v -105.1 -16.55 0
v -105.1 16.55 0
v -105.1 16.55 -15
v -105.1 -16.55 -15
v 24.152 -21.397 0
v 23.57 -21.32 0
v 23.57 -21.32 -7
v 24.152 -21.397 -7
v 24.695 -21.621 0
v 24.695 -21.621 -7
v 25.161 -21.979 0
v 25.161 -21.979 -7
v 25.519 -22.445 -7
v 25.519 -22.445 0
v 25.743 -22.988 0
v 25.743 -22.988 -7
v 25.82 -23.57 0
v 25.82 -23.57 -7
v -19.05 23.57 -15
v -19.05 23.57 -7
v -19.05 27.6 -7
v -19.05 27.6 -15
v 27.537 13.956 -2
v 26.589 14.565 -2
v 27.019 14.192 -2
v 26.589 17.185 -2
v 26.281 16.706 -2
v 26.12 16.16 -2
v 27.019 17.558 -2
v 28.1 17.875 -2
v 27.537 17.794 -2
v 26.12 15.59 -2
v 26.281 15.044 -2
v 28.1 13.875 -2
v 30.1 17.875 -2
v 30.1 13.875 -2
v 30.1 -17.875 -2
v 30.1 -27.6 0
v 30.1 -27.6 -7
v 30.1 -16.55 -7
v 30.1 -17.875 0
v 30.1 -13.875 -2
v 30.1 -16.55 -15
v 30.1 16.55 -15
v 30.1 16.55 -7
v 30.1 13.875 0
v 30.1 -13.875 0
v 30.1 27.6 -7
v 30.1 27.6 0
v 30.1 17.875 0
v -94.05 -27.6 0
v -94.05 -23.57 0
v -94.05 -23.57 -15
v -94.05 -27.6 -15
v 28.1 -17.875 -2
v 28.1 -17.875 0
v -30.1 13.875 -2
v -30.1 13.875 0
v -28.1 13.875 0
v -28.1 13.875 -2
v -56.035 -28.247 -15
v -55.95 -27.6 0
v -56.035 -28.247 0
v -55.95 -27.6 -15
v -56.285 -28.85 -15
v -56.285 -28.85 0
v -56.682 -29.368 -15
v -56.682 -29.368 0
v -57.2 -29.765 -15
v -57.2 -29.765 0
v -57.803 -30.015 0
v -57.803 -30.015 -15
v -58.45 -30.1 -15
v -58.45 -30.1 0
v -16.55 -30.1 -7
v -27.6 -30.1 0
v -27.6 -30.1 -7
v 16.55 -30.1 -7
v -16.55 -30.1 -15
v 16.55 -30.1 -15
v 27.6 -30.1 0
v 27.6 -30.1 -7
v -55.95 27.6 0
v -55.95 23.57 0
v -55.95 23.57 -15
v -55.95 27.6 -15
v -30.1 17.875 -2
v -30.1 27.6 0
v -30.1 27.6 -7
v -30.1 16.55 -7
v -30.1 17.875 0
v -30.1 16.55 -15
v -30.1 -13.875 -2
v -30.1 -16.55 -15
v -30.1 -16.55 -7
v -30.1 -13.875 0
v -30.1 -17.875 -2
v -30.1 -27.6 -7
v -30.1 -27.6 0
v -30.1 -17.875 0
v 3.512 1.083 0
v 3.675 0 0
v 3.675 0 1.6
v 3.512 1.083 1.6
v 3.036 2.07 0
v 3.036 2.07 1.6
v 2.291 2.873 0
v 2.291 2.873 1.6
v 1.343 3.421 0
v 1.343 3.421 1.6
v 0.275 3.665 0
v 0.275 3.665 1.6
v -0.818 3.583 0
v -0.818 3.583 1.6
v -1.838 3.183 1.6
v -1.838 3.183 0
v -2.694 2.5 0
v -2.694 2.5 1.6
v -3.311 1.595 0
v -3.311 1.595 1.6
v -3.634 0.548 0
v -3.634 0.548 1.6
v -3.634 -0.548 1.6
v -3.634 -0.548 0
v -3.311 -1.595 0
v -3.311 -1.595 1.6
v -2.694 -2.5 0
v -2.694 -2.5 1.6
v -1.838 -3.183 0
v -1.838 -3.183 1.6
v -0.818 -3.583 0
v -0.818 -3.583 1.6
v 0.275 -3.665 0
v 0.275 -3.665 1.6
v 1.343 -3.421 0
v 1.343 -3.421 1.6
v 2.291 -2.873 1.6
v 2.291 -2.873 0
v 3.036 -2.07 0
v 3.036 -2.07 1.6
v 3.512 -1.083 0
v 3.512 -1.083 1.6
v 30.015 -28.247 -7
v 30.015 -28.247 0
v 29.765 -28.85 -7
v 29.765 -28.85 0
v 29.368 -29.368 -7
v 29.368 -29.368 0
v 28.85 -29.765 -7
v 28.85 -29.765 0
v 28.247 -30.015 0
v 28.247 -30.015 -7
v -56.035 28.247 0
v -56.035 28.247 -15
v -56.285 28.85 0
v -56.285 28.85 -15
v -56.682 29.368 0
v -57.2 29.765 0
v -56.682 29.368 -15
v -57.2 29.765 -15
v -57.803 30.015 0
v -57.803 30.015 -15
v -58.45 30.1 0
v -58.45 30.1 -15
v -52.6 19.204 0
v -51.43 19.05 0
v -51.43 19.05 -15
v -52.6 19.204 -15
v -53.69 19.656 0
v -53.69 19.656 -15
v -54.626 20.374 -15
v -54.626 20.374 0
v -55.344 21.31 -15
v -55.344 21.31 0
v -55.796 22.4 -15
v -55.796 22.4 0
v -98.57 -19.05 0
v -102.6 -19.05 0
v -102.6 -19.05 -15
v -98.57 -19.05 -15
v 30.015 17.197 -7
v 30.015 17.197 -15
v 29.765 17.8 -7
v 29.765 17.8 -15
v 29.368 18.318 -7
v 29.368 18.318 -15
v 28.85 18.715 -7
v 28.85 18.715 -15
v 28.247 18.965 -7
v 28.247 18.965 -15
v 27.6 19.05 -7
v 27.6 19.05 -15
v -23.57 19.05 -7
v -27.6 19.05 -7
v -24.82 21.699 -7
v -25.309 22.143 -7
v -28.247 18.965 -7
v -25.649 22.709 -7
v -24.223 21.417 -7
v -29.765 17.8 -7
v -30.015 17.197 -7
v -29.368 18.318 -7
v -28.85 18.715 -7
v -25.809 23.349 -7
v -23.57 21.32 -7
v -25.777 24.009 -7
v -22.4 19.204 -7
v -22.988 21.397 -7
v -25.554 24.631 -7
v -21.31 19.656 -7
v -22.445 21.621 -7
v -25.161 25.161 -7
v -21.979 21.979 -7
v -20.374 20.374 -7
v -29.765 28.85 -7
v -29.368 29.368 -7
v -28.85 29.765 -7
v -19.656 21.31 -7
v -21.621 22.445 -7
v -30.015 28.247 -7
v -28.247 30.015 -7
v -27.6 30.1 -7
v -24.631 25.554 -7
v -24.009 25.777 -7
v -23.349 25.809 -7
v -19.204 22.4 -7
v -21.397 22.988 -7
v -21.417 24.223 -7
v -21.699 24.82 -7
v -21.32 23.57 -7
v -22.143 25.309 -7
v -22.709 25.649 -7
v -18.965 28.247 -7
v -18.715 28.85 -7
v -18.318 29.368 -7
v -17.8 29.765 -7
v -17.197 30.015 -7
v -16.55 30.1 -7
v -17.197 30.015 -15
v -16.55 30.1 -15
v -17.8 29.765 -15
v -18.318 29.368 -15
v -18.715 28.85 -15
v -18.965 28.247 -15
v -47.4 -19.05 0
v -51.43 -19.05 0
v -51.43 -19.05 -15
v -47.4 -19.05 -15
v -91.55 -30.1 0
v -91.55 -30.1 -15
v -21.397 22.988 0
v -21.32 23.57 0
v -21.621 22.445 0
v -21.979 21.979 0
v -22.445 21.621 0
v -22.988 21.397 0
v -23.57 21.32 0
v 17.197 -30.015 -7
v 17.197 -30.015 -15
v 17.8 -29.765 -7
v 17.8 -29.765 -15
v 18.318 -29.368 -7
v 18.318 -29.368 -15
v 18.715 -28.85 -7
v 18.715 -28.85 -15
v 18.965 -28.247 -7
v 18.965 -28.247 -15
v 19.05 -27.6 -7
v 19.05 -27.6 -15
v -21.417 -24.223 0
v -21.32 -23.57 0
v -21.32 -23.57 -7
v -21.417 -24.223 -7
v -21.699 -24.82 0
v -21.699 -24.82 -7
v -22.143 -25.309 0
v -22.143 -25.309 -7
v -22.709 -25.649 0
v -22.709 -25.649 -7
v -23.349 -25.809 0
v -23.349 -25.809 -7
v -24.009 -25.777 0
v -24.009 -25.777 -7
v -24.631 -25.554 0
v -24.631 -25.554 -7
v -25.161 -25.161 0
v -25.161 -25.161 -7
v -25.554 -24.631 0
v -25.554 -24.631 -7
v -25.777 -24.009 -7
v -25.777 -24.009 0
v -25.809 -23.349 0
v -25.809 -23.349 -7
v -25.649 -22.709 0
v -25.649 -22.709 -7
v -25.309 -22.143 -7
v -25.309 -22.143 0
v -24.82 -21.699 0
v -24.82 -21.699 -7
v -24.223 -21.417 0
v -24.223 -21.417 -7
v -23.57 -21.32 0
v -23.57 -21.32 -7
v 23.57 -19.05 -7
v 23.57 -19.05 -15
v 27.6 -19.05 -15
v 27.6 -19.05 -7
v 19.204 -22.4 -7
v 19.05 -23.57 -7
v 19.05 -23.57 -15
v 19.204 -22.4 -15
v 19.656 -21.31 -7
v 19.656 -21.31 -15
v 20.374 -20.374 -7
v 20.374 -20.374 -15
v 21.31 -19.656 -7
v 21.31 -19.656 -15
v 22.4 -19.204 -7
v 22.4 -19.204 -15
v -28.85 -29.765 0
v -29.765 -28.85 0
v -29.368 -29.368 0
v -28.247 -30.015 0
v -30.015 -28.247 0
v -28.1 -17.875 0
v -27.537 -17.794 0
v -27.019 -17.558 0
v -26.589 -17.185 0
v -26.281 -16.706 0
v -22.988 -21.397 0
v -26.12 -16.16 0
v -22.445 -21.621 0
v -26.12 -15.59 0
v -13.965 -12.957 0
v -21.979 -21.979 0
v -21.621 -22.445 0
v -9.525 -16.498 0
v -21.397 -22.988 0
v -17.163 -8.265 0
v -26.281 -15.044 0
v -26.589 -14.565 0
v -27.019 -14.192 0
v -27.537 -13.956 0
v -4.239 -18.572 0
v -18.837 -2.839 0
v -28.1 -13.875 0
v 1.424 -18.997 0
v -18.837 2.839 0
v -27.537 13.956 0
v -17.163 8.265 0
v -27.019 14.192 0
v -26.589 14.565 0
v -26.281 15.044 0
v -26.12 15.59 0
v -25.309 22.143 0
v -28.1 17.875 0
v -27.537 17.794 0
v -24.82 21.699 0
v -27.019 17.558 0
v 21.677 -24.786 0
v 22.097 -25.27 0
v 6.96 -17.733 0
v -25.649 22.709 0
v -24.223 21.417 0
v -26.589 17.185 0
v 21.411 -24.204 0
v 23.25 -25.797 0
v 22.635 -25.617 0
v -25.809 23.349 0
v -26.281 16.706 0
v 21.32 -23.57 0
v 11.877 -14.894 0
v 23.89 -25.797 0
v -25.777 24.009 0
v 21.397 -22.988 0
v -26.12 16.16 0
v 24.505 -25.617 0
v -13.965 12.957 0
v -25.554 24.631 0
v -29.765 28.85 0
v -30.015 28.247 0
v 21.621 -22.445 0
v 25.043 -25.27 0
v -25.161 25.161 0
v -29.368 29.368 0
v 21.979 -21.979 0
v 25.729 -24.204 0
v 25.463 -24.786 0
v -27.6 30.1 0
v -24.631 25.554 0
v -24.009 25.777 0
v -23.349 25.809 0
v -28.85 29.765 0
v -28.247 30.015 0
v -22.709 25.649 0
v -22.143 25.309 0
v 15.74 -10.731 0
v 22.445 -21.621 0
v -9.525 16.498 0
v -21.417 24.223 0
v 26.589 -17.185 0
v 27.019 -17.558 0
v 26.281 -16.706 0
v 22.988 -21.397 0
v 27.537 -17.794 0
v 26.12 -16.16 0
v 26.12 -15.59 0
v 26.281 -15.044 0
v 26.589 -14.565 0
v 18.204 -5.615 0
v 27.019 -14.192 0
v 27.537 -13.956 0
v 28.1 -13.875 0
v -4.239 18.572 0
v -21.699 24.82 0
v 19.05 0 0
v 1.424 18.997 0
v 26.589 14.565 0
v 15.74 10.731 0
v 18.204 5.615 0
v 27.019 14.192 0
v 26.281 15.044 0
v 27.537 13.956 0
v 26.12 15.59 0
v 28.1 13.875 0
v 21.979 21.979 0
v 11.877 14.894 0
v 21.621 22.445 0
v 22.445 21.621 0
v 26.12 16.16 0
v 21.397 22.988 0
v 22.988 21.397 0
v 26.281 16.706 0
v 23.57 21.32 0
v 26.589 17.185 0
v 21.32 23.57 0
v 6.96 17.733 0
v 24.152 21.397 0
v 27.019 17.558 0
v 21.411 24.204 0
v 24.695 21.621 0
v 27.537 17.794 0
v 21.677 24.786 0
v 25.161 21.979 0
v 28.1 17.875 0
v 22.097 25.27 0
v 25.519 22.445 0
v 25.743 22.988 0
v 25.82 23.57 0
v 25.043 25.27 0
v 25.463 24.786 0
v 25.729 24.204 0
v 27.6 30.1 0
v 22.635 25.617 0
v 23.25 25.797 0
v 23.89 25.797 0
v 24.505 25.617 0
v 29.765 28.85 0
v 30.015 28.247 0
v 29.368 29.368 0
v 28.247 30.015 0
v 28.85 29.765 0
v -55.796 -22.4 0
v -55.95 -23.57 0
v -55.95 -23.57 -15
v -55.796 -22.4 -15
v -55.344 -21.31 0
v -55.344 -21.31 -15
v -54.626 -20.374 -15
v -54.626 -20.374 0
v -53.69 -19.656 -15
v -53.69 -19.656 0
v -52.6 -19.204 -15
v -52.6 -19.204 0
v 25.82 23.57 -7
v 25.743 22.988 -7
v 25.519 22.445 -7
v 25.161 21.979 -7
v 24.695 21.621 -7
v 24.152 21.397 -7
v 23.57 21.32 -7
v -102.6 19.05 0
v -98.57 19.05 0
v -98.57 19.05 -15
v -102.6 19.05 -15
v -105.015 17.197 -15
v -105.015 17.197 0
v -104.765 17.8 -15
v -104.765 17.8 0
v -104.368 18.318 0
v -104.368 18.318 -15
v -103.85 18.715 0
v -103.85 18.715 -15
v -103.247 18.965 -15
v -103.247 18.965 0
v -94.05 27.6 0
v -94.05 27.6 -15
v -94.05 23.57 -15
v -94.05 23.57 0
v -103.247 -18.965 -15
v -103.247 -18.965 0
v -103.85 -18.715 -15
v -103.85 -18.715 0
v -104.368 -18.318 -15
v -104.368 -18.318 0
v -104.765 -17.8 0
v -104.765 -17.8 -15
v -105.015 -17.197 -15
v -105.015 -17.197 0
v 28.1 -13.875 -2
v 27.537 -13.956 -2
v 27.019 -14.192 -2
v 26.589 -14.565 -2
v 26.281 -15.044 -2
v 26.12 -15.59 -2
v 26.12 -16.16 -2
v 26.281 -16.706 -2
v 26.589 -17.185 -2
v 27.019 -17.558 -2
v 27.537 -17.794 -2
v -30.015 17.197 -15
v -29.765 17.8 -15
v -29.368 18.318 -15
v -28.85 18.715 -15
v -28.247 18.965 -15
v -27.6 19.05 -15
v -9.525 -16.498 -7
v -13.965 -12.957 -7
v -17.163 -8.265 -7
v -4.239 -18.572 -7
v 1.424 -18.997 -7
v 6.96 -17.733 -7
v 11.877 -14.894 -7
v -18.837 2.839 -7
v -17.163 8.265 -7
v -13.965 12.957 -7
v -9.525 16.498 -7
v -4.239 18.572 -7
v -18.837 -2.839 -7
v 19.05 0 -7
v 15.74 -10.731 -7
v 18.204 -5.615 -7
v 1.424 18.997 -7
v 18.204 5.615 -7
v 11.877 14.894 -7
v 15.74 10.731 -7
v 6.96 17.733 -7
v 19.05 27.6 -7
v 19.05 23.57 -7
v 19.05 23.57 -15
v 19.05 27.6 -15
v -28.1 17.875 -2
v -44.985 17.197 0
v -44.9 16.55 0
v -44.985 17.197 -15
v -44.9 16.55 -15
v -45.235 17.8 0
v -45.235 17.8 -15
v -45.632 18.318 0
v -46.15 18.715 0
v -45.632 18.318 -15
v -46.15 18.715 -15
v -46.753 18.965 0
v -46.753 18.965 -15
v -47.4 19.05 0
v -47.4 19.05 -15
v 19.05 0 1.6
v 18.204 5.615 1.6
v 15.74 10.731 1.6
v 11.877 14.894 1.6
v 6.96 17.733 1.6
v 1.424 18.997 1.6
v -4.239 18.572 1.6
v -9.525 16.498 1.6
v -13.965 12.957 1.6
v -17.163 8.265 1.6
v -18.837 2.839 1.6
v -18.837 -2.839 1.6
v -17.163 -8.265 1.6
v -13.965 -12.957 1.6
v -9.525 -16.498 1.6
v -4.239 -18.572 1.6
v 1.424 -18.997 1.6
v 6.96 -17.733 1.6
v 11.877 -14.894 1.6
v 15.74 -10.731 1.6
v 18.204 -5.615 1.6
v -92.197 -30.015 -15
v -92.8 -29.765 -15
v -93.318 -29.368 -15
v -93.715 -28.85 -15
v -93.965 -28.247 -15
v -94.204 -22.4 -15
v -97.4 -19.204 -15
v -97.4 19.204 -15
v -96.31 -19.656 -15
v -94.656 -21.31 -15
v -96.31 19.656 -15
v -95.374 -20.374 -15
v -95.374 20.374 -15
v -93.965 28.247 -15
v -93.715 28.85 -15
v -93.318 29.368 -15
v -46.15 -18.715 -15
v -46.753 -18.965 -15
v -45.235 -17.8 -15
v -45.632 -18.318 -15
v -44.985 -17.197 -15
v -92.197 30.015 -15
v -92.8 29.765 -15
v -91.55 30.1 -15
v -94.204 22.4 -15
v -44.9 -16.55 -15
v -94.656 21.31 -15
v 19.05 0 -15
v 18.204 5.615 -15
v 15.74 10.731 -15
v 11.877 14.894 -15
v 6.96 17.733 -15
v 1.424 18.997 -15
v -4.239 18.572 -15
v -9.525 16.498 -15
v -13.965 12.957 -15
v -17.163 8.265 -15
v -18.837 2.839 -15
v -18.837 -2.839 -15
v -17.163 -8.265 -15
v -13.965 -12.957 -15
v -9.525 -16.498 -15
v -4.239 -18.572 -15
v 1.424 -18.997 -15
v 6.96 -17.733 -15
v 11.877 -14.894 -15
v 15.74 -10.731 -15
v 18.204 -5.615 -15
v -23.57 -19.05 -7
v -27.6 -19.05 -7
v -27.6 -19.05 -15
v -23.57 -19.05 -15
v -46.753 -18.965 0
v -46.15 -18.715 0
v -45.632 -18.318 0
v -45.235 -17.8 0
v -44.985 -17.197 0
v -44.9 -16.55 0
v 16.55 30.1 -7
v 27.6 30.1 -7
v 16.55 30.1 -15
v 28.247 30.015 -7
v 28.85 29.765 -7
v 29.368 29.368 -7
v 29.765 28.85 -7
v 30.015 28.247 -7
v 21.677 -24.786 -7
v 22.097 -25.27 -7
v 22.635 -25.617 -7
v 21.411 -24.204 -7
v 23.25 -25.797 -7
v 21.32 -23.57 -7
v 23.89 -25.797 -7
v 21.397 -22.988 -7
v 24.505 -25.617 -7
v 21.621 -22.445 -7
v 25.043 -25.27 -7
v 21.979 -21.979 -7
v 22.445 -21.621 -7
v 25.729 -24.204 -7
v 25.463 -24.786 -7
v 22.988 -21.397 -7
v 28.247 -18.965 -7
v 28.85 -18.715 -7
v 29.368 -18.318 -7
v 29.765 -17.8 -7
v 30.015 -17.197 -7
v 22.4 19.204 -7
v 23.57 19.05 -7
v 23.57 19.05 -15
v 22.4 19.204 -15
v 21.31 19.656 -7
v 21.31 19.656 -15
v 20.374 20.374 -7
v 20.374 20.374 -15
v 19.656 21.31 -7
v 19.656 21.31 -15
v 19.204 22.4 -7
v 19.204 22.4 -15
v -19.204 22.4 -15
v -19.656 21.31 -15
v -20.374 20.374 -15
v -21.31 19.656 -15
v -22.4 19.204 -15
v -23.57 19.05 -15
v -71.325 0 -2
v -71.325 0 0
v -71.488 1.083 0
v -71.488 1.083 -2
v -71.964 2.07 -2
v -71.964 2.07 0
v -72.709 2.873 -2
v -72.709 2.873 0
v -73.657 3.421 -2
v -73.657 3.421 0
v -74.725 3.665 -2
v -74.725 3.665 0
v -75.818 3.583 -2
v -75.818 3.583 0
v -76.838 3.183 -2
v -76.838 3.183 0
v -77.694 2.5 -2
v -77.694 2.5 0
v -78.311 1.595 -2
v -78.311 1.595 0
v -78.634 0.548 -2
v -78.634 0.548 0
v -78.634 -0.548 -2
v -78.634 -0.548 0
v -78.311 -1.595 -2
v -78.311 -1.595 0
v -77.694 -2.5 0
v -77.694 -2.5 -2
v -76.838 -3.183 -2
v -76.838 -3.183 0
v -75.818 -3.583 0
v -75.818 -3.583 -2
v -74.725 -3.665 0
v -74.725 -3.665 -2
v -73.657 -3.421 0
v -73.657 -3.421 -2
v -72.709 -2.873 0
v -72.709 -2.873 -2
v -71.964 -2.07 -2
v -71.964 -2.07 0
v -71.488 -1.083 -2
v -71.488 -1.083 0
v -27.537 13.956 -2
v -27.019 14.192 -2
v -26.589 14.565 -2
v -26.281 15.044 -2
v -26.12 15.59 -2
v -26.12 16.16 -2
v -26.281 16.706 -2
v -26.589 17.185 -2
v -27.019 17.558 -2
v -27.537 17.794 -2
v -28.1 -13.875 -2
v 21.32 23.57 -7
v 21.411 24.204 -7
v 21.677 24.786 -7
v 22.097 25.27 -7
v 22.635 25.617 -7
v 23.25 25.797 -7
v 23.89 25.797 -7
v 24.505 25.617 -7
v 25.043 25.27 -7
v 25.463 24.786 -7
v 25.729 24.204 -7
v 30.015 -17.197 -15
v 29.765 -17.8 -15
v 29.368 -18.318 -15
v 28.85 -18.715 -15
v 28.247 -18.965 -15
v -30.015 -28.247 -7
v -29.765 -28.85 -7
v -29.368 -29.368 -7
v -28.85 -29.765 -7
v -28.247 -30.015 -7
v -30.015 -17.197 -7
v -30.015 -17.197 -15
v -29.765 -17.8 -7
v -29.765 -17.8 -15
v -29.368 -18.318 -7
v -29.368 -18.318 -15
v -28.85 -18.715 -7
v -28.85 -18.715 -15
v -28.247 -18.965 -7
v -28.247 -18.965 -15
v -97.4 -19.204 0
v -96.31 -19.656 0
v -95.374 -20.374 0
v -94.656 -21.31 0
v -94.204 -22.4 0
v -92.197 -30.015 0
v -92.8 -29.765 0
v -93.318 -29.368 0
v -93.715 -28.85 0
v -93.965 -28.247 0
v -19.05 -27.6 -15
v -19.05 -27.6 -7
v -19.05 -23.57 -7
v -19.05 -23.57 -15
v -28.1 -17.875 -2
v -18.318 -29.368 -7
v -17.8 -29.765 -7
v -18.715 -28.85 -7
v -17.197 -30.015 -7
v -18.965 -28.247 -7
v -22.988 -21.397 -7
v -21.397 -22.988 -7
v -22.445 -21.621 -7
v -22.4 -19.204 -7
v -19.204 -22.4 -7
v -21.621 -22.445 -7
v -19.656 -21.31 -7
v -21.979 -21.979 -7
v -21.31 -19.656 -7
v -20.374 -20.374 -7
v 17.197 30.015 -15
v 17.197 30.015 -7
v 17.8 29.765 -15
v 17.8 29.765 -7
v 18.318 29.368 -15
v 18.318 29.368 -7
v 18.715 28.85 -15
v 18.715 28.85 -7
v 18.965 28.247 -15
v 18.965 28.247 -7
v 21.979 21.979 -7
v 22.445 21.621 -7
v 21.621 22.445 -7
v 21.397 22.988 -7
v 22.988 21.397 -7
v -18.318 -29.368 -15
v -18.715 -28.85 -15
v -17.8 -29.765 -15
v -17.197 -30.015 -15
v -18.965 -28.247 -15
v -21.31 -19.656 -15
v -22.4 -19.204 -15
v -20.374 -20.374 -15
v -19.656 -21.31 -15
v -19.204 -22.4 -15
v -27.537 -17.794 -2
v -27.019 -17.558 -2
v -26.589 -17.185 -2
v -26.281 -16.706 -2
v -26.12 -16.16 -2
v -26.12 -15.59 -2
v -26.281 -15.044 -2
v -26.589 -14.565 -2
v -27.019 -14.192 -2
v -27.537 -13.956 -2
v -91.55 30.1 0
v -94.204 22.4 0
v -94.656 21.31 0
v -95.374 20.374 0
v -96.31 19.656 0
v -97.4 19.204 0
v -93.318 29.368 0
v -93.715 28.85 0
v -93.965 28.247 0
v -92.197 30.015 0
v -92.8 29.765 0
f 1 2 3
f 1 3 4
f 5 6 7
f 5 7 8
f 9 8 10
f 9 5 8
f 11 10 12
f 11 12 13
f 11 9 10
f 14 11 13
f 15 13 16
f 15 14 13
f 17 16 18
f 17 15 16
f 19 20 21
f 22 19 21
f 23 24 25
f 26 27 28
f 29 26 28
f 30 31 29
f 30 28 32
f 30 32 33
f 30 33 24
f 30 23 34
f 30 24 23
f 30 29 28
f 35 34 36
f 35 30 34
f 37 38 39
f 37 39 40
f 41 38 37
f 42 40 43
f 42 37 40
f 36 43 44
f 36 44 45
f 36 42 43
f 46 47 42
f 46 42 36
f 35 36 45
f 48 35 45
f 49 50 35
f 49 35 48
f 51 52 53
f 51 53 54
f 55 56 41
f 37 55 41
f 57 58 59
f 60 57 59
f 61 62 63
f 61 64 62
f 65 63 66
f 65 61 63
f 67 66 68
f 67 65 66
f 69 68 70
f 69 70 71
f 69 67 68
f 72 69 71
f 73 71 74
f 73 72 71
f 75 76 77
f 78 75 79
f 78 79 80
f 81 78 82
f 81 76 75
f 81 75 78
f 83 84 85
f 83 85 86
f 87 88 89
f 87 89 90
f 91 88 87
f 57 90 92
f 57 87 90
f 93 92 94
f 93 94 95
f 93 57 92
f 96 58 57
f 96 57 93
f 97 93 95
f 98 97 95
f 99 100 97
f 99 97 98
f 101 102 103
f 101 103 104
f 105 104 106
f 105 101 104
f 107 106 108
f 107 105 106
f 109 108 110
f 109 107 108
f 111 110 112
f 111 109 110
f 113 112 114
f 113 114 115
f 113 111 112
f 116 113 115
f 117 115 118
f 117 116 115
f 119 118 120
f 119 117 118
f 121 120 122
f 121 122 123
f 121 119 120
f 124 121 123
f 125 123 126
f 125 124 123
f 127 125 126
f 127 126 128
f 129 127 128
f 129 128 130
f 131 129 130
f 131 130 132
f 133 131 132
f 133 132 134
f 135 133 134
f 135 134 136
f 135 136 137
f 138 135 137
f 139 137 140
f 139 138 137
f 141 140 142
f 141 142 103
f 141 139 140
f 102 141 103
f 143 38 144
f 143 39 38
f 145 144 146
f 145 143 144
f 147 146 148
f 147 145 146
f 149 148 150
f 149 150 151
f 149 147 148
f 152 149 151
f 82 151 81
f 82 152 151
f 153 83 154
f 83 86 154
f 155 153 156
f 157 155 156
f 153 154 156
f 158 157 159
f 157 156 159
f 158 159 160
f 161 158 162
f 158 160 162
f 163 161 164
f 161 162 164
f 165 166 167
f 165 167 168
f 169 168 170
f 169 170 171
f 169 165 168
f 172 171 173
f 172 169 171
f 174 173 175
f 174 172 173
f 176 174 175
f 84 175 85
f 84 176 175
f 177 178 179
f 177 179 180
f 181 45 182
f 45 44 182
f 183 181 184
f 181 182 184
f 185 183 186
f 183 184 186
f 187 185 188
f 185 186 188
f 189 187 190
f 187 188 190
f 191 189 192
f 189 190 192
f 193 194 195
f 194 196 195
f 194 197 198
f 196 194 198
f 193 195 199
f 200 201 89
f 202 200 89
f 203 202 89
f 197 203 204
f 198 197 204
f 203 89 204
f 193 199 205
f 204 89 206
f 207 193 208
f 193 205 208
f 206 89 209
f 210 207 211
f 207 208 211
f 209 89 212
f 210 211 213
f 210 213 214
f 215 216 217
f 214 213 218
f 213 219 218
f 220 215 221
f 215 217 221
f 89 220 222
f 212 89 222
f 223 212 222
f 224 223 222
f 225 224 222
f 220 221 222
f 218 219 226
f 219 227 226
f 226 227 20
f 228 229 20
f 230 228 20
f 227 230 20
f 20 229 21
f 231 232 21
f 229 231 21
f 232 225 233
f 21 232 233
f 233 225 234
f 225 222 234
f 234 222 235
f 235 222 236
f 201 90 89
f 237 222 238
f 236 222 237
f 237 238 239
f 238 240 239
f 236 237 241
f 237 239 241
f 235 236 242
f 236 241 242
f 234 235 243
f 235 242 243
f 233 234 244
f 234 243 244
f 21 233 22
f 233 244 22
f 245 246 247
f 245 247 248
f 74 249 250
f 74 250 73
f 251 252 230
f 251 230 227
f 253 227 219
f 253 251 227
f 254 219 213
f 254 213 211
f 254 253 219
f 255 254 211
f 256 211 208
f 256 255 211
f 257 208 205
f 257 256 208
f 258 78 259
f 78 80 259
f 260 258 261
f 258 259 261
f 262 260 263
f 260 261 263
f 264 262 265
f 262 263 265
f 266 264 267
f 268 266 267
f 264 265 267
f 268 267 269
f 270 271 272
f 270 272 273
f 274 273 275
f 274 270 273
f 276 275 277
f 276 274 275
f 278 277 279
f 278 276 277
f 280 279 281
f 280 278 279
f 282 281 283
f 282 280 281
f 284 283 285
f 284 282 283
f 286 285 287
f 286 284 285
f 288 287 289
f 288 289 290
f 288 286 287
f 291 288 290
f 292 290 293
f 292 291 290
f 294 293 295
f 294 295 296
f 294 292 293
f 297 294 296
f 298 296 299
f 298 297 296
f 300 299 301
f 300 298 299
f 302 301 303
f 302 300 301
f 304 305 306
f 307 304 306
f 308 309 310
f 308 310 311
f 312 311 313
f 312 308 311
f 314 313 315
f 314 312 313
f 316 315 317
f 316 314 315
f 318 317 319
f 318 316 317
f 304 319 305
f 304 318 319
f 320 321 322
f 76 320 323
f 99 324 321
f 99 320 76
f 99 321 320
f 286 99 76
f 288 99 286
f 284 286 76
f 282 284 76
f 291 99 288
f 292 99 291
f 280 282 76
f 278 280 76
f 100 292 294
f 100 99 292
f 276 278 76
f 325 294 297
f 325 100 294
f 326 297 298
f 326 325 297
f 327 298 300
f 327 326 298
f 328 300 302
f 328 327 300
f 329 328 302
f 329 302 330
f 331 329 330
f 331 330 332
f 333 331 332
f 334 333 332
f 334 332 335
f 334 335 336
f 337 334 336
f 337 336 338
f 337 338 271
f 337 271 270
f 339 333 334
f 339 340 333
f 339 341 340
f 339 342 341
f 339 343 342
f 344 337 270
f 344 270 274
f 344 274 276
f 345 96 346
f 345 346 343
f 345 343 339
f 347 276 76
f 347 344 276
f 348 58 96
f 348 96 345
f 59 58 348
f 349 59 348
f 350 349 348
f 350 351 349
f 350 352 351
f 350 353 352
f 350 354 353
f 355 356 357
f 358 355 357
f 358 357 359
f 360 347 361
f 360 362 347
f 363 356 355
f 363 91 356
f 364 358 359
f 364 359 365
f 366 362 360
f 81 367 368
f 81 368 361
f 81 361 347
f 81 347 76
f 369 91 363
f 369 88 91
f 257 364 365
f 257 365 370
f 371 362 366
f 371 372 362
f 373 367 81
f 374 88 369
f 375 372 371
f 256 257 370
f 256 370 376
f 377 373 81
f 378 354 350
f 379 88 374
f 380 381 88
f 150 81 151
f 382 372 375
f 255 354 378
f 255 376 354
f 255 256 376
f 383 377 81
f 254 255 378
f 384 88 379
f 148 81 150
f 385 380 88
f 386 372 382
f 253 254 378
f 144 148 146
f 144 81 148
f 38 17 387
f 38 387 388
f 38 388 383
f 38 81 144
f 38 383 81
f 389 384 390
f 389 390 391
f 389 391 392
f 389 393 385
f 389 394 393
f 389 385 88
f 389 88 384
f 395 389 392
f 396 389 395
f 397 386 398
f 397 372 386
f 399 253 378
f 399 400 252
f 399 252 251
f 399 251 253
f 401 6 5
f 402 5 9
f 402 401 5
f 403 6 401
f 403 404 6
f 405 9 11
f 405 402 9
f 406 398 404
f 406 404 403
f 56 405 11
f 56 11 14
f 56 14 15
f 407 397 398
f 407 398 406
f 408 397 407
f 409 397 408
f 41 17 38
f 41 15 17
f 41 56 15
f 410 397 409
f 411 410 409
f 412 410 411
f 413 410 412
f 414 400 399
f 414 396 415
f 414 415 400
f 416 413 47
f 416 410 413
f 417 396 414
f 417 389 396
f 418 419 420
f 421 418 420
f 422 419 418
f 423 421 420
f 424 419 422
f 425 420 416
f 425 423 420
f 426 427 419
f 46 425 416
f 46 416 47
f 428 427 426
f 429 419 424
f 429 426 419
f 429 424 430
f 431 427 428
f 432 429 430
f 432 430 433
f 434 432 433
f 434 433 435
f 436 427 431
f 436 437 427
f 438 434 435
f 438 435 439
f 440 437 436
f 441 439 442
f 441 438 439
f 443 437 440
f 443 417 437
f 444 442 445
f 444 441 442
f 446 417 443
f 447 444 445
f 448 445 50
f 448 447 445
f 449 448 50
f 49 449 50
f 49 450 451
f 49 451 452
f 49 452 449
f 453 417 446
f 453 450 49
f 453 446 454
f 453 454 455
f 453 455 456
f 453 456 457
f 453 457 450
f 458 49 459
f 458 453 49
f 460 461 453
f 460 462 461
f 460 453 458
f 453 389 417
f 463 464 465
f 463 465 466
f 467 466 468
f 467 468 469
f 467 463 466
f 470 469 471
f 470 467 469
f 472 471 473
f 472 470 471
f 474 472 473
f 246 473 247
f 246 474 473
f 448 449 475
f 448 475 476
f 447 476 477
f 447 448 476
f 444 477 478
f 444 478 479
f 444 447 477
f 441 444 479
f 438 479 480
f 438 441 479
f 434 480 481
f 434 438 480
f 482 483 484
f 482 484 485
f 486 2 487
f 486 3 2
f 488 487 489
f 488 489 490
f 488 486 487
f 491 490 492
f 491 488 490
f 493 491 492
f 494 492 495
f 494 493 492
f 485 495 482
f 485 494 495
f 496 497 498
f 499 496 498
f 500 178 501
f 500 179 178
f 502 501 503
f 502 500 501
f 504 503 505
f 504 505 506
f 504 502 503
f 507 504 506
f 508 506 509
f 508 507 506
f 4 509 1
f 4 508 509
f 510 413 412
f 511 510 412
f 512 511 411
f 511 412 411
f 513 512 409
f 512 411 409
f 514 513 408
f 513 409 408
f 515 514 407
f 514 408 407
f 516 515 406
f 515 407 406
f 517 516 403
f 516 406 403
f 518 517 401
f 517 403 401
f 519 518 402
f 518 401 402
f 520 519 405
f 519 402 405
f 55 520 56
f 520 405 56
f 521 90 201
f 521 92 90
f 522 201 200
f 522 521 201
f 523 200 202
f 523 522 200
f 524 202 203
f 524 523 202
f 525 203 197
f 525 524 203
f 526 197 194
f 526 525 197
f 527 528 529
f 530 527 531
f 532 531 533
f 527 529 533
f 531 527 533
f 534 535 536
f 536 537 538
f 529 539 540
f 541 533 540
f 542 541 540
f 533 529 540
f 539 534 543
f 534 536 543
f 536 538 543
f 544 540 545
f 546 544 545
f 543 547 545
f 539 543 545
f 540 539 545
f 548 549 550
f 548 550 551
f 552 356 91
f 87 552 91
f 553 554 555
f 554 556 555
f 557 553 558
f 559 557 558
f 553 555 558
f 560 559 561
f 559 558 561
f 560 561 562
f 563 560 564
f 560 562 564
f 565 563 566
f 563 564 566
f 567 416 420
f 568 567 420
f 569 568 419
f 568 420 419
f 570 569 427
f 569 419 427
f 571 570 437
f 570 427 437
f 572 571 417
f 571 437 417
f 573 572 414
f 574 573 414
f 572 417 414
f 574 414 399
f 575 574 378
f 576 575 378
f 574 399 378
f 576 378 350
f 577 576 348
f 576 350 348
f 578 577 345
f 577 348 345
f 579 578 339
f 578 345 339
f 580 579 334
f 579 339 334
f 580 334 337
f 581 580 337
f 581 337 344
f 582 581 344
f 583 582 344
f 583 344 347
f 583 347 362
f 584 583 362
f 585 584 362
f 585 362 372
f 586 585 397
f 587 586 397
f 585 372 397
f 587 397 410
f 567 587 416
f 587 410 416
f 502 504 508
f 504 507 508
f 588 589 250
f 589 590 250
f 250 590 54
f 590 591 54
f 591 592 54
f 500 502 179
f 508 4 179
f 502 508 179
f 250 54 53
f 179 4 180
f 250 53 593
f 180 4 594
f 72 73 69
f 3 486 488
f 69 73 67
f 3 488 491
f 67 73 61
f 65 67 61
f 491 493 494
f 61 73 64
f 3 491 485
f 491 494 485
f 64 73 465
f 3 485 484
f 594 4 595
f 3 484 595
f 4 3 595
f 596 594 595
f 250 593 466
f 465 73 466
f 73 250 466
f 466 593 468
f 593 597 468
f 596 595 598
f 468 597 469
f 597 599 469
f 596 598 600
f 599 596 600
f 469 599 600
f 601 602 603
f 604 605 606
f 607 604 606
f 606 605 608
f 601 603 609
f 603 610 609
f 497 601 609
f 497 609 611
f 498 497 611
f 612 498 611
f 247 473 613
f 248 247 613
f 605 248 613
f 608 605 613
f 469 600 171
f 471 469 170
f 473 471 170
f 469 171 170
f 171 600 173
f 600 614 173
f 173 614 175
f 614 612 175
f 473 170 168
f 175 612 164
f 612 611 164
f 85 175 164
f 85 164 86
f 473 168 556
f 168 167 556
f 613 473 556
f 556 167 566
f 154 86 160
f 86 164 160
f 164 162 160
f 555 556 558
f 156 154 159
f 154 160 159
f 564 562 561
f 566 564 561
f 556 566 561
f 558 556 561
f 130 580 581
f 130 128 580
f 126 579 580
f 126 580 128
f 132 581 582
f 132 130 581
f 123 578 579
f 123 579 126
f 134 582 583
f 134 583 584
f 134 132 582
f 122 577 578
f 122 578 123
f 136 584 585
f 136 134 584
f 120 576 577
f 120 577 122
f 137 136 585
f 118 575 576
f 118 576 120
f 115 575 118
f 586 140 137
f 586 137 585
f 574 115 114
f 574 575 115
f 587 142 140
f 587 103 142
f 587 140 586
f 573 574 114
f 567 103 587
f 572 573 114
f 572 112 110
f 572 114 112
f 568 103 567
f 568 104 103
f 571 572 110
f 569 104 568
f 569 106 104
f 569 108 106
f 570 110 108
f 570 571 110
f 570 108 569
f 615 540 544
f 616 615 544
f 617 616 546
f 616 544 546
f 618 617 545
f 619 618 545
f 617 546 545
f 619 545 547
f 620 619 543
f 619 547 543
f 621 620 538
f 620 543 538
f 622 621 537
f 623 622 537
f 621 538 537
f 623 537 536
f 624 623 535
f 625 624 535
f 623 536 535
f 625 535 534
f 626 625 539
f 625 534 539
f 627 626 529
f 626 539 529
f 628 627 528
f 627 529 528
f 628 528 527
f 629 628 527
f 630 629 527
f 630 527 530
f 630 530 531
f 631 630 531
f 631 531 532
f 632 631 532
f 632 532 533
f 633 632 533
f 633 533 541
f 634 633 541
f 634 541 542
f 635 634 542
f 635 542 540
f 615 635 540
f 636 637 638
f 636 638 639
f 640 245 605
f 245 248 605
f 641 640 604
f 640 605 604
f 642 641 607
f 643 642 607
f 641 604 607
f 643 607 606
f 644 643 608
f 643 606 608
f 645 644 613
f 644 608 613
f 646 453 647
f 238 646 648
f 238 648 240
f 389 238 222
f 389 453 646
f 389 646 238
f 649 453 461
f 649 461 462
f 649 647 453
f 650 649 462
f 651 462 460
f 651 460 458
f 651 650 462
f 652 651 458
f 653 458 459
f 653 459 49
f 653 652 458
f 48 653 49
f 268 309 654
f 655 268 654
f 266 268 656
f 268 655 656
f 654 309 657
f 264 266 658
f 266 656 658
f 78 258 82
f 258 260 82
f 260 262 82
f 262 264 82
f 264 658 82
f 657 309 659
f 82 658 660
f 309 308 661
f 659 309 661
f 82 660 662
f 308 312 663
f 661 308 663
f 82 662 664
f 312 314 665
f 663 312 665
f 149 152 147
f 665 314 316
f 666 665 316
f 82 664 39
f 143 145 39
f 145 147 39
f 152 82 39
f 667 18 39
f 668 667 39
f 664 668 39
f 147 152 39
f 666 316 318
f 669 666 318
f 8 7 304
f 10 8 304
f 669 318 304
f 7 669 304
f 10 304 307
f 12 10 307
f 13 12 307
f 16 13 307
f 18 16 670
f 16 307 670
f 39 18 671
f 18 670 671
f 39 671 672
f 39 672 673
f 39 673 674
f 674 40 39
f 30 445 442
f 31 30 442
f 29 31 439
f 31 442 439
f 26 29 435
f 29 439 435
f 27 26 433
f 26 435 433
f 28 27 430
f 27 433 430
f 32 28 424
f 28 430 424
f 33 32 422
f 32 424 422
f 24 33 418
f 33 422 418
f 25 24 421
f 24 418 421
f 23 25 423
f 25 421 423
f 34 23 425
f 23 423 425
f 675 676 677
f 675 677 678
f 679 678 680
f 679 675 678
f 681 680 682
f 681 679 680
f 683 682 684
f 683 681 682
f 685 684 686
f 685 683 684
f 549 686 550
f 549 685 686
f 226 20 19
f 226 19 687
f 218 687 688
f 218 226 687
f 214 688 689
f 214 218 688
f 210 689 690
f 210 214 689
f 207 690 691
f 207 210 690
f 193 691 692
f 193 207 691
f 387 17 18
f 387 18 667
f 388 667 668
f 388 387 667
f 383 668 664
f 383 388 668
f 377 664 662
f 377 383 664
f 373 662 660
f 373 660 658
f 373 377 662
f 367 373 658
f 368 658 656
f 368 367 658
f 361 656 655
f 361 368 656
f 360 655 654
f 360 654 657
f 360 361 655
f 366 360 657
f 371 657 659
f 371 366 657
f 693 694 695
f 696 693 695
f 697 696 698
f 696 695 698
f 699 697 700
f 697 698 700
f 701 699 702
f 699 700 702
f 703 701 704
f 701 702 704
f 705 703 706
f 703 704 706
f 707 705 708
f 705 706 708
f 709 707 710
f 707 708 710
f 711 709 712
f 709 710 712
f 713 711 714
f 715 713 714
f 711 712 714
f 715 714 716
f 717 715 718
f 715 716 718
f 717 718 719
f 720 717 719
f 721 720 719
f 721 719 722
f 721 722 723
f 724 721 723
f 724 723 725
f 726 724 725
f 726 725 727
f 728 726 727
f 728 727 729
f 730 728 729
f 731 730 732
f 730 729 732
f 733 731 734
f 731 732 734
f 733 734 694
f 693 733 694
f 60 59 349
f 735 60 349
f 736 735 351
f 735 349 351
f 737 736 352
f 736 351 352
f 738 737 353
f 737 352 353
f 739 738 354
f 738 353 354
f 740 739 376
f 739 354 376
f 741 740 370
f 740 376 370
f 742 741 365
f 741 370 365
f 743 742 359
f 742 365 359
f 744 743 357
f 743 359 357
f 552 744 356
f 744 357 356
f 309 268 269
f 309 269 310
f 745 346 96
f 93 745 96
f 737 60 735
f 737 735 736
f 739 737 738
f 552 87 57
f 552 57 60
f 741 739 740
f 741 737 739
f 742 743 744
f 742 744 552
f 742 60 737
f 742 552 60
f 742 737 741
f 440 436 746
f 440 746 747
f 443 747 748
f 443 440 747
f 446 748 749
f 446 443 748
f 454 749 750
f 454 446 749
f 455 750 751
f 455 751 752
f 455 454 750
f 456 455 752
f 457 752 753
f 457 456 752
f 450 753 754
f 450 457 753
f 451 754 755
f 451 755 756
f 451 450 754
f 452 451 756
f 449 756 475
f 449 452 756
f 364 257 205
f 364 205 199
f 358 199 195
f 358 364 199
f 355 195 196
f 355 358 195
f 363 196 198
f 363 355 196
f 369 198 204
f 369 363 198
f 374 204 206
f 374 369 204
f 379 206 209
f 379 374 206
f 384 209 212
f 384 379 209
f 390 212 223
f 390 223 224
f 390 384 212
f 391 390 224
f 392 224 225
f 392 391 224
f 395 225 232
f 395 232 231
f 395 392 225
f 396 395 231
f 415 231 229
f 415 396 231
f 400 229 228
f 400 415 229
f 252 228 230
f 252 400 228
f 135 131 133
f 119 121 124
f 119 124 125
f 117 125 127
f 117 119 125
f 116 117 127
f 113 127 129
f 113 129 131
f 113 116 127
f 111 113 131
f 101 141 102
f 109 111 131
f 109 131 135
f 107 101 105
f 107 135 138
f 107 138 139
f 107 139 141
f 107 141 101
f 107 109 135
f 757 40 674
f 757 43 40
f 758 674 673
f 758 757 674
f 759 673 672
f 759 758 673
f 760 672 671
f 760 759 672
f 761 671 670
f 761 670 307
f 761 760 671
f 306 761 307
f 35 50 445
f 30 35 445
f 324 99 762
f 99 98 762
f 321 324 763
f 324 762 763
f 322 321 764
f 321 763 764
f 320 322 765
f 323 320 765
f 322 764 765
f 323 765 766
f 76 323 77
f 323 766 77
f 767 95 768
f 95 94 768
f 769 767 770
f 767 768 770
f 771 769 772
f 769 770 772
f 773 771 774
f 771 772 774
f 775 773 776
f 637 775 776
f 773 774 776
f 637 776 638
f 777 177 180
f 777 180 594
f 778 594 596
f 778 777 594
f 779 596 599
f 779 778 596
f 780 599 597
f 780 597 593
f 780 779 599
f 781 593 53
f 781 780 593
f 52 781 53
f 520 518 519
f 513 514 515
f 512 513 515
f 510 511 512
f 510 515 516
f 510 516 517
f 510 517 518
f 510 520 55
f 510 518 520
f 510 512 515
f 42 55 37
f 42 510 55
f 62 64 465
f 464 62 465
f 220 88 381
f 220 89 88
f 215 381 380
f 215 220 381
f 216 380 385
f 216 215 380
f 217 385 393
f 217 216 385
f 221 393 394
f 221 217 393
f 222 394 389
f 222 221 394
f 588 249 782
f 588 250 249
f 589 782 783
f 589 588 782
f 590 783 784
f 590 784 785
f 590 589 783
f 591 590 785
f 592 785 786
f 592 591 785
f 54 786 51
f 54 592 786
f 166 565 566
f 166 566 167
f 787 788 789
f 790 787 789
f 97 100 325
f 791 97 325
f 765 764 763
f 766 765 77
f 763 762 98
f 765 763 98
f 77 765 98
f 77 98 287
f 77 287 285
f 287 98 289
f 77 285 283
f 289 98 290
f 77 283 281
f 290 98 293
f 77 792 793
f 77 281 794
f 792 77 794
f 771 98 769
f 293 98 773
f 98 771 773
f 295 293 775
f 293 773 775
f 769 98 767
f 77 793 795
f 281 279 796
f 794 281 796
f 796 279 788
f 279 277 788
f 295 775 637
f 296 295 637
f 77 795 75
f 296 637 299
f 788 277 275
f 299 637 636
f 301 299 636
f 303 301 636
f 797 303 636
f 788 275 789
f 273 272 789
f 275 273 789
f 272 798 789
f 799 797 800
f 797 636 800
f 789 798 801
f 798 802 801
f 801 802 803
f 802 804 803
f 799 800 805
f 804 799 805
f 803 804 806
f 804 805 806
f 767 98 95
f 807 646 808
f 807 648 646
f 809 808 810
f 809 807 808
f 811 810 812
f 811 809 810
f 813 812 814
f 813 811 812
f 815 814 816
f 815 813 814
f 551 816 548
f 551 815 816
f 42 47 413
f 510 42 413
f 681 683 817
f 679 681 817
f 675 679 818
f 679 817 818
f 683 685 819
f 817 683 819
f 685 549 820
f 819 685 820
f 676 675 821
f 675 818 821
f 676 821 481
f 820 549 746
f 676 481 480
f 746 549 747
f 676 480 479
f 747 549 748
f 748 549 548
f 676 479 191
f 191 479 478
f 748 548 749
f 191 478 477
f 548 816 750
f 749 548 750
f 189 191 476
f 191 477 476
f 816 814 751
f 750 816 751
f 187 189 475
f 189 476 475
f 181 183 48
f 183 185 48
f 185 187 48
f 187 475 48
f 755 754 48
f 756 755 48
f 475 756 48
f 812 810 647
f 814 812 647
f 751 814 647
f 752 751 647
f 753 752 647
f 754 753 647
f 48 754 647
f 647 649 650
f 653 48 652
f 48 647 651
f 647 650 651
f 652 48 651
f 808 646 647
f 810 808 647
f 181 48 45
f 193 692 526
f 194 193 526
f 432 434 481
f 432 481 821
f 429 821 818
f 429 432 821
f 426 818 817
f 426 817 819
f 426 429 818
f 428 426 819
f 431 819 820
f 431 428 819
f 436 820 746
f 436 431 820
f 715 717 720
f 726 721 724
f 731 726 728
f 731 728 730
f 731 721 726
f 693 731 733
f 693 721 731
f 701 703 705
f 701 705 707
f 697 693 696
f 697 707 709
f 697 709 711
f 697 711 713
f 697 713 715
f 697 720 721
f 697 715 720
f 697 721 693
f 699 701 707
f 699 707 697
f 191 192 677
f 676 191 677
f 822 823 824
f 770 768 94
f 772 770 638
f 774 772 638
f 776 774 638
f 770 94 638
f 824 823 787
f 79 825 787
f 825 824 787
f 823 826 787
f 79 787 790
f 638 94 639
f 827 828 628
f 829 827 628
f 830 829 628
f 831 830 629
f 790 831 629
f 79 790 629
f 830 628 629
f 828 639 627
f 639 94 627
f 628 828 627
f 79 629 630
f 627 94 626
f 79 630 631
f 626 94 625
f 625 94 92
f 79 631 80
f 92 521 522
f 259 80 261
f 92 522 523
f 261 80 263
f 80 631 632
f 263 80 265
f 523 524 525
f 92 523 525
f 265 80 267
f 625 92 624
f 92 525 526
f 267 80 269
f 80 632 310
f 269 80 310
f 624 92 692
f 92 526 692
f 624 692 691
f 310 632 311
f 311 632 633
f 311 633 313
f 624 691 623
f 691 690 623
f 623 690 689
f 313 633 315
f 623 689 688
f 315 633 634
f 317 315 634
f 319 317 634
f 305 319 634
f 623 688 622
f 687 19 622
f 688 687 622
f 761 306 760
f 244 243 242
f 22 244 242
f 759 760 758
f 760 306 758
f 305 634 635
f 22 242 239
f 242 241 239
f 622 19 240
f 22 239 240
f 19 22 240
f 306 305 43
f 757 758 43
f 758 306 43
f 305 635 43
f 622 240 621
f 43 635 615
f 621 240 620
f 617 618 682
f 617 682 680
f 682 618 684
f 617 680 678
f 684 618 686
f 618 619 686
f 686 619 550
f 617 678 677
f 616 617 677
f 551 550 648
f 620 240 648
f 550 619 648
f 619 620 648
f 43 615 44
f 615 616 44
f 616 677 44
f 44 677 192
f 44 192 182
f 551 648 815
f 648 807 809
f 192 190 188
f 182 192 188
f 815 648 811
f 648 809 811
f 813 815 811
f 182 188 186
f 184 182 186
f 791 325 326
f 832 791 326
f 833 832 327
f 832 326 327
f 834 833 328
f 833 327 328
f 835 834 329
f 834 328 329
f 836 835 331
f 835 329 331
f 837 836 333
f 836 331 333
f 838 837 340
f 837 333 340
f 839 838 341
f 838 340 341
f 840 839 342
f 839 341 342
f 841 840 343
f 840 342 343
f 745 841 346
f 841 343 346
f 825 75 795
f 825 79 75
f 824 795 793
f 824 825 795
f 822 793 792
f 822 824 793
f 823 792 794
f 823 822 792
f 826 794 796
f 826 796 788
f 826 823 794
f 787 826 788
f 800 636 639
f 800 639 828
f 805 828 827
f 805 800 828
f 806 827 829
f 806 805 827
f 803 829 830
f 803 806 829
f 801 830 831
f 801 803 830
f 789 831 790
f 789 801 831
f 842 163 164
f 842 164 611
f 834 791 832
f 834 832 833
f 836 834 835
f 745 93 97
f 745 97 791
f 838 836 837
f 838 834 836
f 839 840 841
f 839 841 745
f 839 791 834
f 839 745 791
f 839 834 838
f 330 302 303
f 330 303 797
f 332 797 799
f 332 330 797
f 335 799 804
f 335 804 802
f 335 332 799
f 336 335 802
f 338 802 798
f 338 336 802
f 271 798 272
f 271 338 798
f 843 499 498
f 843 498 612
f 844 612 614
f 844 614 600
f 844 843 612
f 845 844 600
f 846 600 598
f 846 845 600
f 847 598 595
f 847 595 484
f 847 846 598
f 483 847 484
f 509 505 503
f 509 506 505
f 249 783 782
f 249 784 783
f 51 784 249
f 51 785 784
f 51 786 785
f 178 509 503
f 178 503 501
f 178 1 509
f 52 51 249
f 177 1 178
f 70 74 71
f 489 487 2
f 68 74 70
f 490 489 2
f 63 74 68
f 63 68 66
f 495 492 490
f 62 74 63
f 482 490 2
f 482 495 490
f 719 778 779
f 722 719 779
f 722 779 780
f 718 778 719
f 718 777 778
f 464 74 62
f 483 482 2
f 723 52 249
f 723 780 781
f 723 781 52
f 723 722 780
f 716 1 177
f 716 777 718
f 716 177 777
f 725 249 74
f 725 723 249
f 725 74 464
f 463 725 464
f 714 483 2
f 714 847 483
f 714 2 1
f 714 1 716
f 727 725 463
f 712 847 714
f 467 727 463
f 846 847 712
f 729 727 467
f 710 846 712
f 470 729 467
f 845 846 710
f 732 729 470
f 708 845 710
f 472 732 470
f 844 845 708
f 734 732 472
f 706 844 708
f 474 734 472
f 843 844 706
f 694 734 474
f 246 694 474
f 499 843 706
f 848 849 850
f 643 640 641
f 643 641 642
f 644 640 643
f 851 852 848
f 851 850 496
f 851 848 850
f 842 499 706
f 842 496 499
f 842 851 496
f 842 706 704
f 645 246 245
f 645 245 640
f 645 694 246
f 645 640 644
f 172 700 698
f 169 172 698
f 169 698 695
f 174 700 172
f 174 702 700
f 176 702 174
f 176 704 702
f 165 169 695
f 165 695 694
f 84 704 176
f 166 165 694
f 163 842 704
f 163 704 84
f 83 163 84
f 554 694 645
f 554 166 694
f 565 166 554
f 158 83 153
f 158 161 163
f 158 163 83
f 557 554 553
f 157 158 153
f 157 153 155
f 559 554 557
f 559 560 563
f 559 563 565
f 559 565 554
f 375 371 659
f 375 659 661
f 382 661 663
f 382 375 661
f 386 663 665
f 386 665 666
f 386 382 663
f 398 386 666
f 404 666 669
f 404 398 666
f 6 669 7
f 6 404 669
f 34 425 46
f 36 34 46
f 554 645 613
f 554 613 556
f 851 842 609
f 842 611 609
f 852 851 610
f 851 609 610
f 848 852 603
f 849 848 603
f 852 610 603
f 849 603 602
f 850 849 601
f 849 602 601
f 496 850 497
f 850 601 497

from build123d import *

# Parameters (mm, degrees)
F0_R     = 19.05
F0_R_2   = 3.675
F0_W     = 38.1
F0_H     = 6.53
F1_DEPTH = 7
F2_DEPTH = 15
F3_DEPTH = 1.6
F4_DEPTH = 2
F5_DEPTH = 15
F6_DEPTH = 2
F7_R     = 2.5
F7_2_R   = 2.5


with BuildPart() as f1:
    # F0 (on Top) → F1 (new body)
    with BuildSketch(Plane.XY):
        with BuildLine():
            ThreePointArc((23.57, 19.05), (20.373877349, 20.373877349), (19.05, 23.57))
            Line((19.05, 23.57), (-19.05, 23.57))
            ThreePointArc((-19.05, 23.57), (-20.373877349, 20.373877349), (-23.57, 19.05))
            Line((-23.57, 19.05), (-23.57, -19.05))
            ThreePointArc((-23.57, -19.05), (-20.373877349, -20.373877349), (-19.05, -23.57))
            Line((-19.05, -23.57), (19.05, -23.57))
            ThreePointArc((19.05, -23.57), (20.373877349, -20.373877349), (23.57, -19.05))
            Line((23.57, -19.05), (23.57, 19.05))
        make_face()
        Circle(F0_R, mode=Mode.SUBTRACT)
        Circle(F0_R)
        Circle(F0_R_2, mode=Mode.SUBTRACT)
        with Locations((0, 26.835)):
            Rectangle(F0_W, F0_H)
        with Locations((0, -26.835)):
            Rectangle(F0_W, F0_H)
        with BuildLine():
            Line((-23.57, 19.05), (-30.1, 19.05))
            Line((-30.1, 19.05), (-30.1, 17.875))
            Line((-30.1, 17.875), (-28.1, 17.875))
            ThreePointArc((-28.1, 17.875), (-26.1, 15.875), (-28.1, 13.875))
            Line((-28.1, 13.875), (-30.1, 13.875))
            Line((-30.1, 13.875), (-30.1, -13.875))
            Line((-30.1, -13.875), (-28.1, -13.875))
            ThreePointArc((-28.1, -13.875), (-26.1, -15.875), (-28.1, -17.875))
            Line((-28.1, -17.875), (-30.1, -17.875))
            Line((-30.1, -17.875), (-30.1, -19.05))
            Line((-30.1, -19.05), (-23.57, -19.05))
            Line((-23.57, -19.05), (-23.57, 19.05))
        make_face()
        with BuildLine():
            Line((30.1, 17.875), (30.1, 19.05))
            Line((30.1, 19.05), (23.57, 19.05))
            Line((23.57, 19.05), (23.57, -19.05))
            Line((23.57, -19.05), (30.1, -19.05))
            Line((30.1, -19.05), (30.1, -17.875))
            Line((30.1, -17.875), (28.1, -17.875))
            ThreePointArc((28.1, -17.875), (26.1, -15.875), (28.1, -13.875))
            Line((28.1, -13.875), (30.1, -13.875))
            Line((30.1, -13.875), (30.1, 13.875))
            Line((30.1, 13.875), (28.1, 13.875))
            ThreePointArc((28.1, 13.875), (26.1, 15.875), (28.1, 17.875))
            Line((28.1, 17.875), (30.1, 17.875))
        make_face()
        with BuildLine():
            Line((-19.05, 23.57), (-19.05, 30.1))
            Line((-19.05, 30.1), (-30.1, 30.1))
            Line((-30.1, 30.1), (-30.1, 19.05))
            Line((-30.1, 19.05), (-23.57, 19.05))
            Line((-23.57, 19.05), (-23.57, 21.32))
            ThreePointArc((-23.57, 21.32), (-25.1609902577, 25.1609902577), (-21.32, 23.57))
            Line((-21.32, 23.57), (-19.05, 23.57))
        make_face()
        with BuildLine():
            Line((30.1, 19.05), (30.1, 30.1))
            Line((30.1, 30.1), (19.05, 30.1))
            Line((19.05, 30.1), (19.05, 23.57))
            Line((19.05, 23.57), (21.32, 23.57))
            ThreePointArc((21.32, 23.57), (23.57, 25.82), (25.82, 23.57))
            ThreePointArc((25.82, 23.57), (25.1609902577, 21.9790097423), (23.57, 21.32))
            Line((23.57, 21.32), (23.57, 19.05))
            Line((23.57, 19.05), (30.1, 19.05))
        make_face()
        with BuildLine():
            Line((-23.57, -21.32), (-23.57, -19.05))
            Line((-23.57, -19.05), (-30.1, -19.05))
            Line((-30.1, -19.05), (-30.1, -30.1))
            Line((-30.1, -30.1), (-19.05, -30.1))
            Line((-19.05, -30.1), (-19.05, -23.57))
            Line((-19.05, -23.57), (-21.32, -23.57))
            ThreePointArc((-21.32, -23.57), (-25.1609902577, -25.1609902577), (-23.57, -21.32))
        make_face()
        with BuildLine():
            Line((30.1, -19.05), (23.57, -19.05))
            Line((23.57, -19.05), (23.57, -21.32))
            ThreePointArc((23.57, -21.32), (25.1609902577, -21.9790097423), (25.82, -23.57))
            ThreePointArc((25.82, -23.57), (23.57, -25.82), (21.32, -23.57))
            Line((21.32, -23.57), (19.05, -23.57))
            Line((19.05, -23.57), (19.05, -30.1))
            Line((19.05, -30.1), (30.1, -30.1))
            Line((30.1, -30.1), (30.1, -19.05))
        make_face()
        Circle(F0_R_2)
        with BuildLine():
            Line((-28.1, 17.875), (-30.1, 17.875))
            Line((-30.1, 17.875), (-30.1, 13.875))
            Line((-30.1, 13.875), (-28.1, 13.875))
            ThreePointArc((-28.1, 13.875), (-26.1, 15.875), (-28.1, 17.875))
        make_face()
        with BuildLine():
            Line((-28.1, -13.875), (-30.1, -13.875))
            Line((-30.1, -13.875), (-30.1, -17.875))
            Line((-30.1, -17.875), (-28.1, -17.875))
            ThreePointArc((-28.1, -17.875), (-26.1, -15.875), (-28.1, -13.875))
        make_face()
        with BuildLine():
            Line((30.1, -17.875), (30.1, -13.875))
            Line((30.1, -13.875), (28.1, -13.875))
            ThreePointArc((28.1, -13.875), (26.1, -15.875), (28.1, -17.875))
            Line((28.1, -17.875), (30.1, -17.875))
        make_face()
        with BuildLine():
            Line((30.1, 13.875), (30.1, 17.875))
            Line((30.1, 17.875), (28.1, 17.875))
            ThreePointArc((28.1, 17.875), (26.1, 15.875), (28.1, 13.875))
            Line((28.1, 13.875), (30.1, 13.875))
        make_face()
        with BuildLine():
            ThreePointArc((-23.57, 19.05), (-20.373877349, 20.373877349), (-19.05, 23.57))
            Line((-19.05, 23.57), (-21.32, 23.57))
            ThreePointArc((-21.32, 23.57), (-21.9790097423, 21.9790097423), (-23.57, 21.32))
            Line((-23.57, 21.32), (-23.57, 19.05))
        make_face()
        with BuildLine():
            ThreePointArc((-19.05, -23.57), (-20.373877349, -20.373877349), (-23.57, -19.05))
            Line((-23.57, -19.05), (-23.57, -21.32))
            ThreePointArc((-23.57, -21.32), (-21.9790097423, -21.9790097423), (-21.32, -23.57))
            Line((-21.32, -23.57), (-19.05, -23.57))
        make_face()
        with BuildLine():
            Line((23.57, -21.32), (23.57, -19.05))
            ThreePointArc((23.57, -19.05), (20.373877349, -20.373877349), (19.05, -23.57))
            Line((19.05, -23.57), (21.32, -23.57))
            ThreePointArc((21.32, -23.57), (21.9790097423, -21.9790097423), (23.57, -21.32))
        make_face()
        with BuildLine():
            Line((21.32, 23.57), (19.05, 23.57))
            ThreePointArc((19.05, 23.57), (20.373877349, 20.373877349), (23.57, 19.05))
            Line((23.57, 19.05), (23.57, 21.32))
            ThreePointArc((23.57, 21.32), (21.9790097423, 21.9790097423), (21.32, 23.57))
        make_face()
    extrude(amount=-F1_DEPTH)

    # F0 (on Top) → F2 (join)
    with BuildSketch(Plane.XY):
        with BuildLine():
            Line((-23.57, 19.05), (-30.1, 19.05))
            Line((-30.1, 19.05), (-30.1, 17.875))
            Line((-30.1, 17.875), (-28.1, 17.875))
            ThreePointArc((-28.1, 17.875), (-26.1, 15.875), (-28.1, 13.875))
            Line((-28.1, 13.875), (-30.1, 13.875))
            Line((-30.1, 13.875), (-30.1, -13.875))
            Line((-30.1, -13.875), (-28.1, -13.875))
            ThreePointArc((-28.1, -13.875), (-26.1, -15.875), (-28.1, -17.875))
            Line((-28.1, -17.875), (-30.1, -17.875))
            Line((-30.1, -17.875), (-30.1, -19.05))
            Line((-30.1, -19.05), (-23.57, -19.05))
            Line((-23.57, -19.05), (-23.57, 19.05))
        make_face()
        with BuildLine():
            Line((-28.1, 17.875), (-30.1, 17.875))
            Line((-30.1, 17.875), (-30.1, 13.875))
            Line((-30.1, 13.875), (-28.1, 13.875))
            ThreePointArc((-28.1, 13.875), (-26.1, 15.875), (-28.1, 17.875))
        make_face()
        with BuildLine():
            Line((-28.1, -13.875), (-30.1, -13.875))
            Line((-30.1, -13.875), (-30.1, -17.875))
            Line((-30.1, -17.875), (-28.1, -17.875))
            ThreePointArc((-28.1, -17.875), (-26.1, -15.875), (-28.1, -13.875))
        make_face()
        with BuildLine():
            ThreePointArc((23.57, 19.05), (20.373877349, 20.373877349), (19.05, 23.57))
            Line((19.05, 23.57), (-19.05, 23.57))
            ThreePointArc((-19.05, 23.57), (-20.373877349, 20.373877349), (-23.57, 19.05))
            Line((-23.57, 19.05), (-23.57, -19.05))
            ThreePointArc((-23.57, -19.05), (-20.373877349, -20.373877349), (-19.05, -23.57))
            Line((-19.05, -23.57), (19.05, -23.57))
            ThreePointArc((19.05, -23.57), (20.373877349, -20.373877349), (23.57, -19.05))
            Line((23.57, -19.05), (23.57, 19.05))
        make_face()
        Circle(F0_R, mode=Mode.SUBTRACT)
        with Locations((0, -26.835)):
            Rectangle(F0_W, F0_H)
        with BuildLine():
            Line((30.1, 17.875), (30.1, 19.05))
            Line((30.1, 19.05), (23.57, 19.05))
            Line((23.57, 19.05), (23.57, -19.05))
            Line((23.57, -19.05), (30.1, -19.05))
            Line((30.1, -19.05), (30.1, -17.875))
            Line((30.1, -17.875), (28.1, -17.875))
            ThreePointArc((28.1, -17.875), (26.1, -15.875), (28.1, -13.875))
            Line((28.1, -13.875), (30.1, -13.875))
            Line((30.1, -13.875), (30.1, 13.875))
            Line((30.1, 13.875), (28.1, 13.875))
            ThreePointArc((28.1, 13.875), (26.1, 15.875), (28.1, 17.875))
            Line((28.1, 17.875), (30.1, 17.875))
        make_face()
        with BuildLine():
            Line((30.1, -17.875), (30.1, -13.875))
            Line((30.1, -13.875), (28.1, -13.875))
            ThreePointArc((28.1, -13.875), (26.1, -15.875), (28.1, -17.875))
            Line((28.1, -17.875), (30.1, -17.875))
        make_face()
        with BuildLine():
            Line((30.1, 13.875), (30.1, 17.875))
            Line((30.1, 17.875), (28.1, 17.875))
            ThreePointArc((28.1, 17.875), (26.1, 15.875), (28.1, 13.875))
            Line((28.1, 13.875), (30.1, 13.875))
        make_face()
        with Locations((0, 26.835)):
            Rectangle(F0_W, F0_H)
    extrude(amount=-F2_DEPTH)

    # F0 (on Top) → F3 (join)
    with BuildSketch(Plane.XY):
        Circle(F0_R)
        Circle(F0_R_2, mode=Mode.SUBTRACT)
    extrude(amount=F3_DEPTH)

    # F0 (on Top) → F4 (cut)
    with BuildSketch(Plane.XY):
        with BuildLine():
            Line((-28.1, 17.875), (-30.1, 17.875))
            Line((-30.1, 17.875), (-30.1, 13.875))
            Line((-30.1, 13.875), (-28.1, 13.875))
            ThreePointArc((-28.1, 13.875), (-26.1, 15.875), (-28.1, 17.875))
        make_face()
        with BuildLine():
            Line((-28.1, -13.875), (-30.1, -13.875))
            Line((-30.1, -13.875), (-30.1, -17.875))
            Line((-30.1, -17.875), (-28.1, -17.875))
            ThreePointArc((-28.1, -17.875), (-26.1, -15.875), (-28.1, -13.875))
        make_face()
        with BuildLine():
            Line((30.1, 13.875), (30.1, 17.875))
            Line((30.1, 17.875), (28.1, 17.875))
            ThreePointArc((28.1, 17.875), (26.1, 15.875), (28.1, 13.875))
            Line((28.1, 13.875), (30.1, 13.875))
        make_face()
        with BuildLine():
            Line((30.1, -17.875), (30.1, -13.875))
            Line((30.1, -13.875), (28.1, -13.875))
            ThreePointArc((28.1, -13.875), (26.1, -15.875), (28.1, -17.875))
            Line((28.1, -17.875), (30.1, -17.875))
        make_face()
    extrude(amount=-F4_DEPTH, mode=Mode.SUBTRACT)

    # F7
    f7_edges = [f1.edges().sort_by_distance(p)[0] for p in [
        (-30.1, -30.1, -3.5),
        (-19.05, -30.1, -11),
        (-30.1, -19.05, -11),
        (19.05, -30.1, -11),
        (30.1, -30.1, -3.5),
        (30.1, -19.05, -11),
        (30.1, 19.05, -11),
        (30.1, 30.1, -3.5),
        (19.05, 30.1, -11),
        (-19.05, 30.1, -11),
        (-30.1, 30.1, -3.5),
        (-30.1, 19.05, -11),
    ]]
    fillet(f7_edges, radius=F7_R)


with BuildPart() as f5:
    # F0 (on Top) → F5 (new body)
    with BuildSketch(Plane.XY):
        with BuildLine():
            Line((-55.95, -30.1), (-55.95, -23.57))
            ThreePointArc((-55.95, -23.57), (-54.626122651, -20.373877349), (-51.43, -19.05))
            Line((-51.43, -19.05), (-44.9, -19.05))
            Line((-44.9, -19.05), (-44.9, 19.05))
            Line((-44.9, 19.05), (-51.43, 19.05))
            ThreePointArc((-51.43, 19.05), (-54.626122651, 20.373877349), (-55.95, 23.57))
            Line((-55.95, 23.57), (-55.95, 30.1))
            Line((-55.95, 30.1), (-94.05, 30.1))
            Line((-94.05, 30.1), (-94.05, 23.57))
            ThreePointArc((-94.05, 23.57), (-95.373877349, 20.373877349), (-98.57, 19.05))
            Line((-98.57, 19.05), (-105.1, 19.05))
            Line((-105.1, 19.05), (-105.1, -19.05))
            Line((-105.1, -19.05), (-98.57, -19.05))
            ThreePointArc((-98.57, -19.05), (-95.373877349, -20.373877349), (-94.05, -23.57))
            Line((-94.05, -23.57), (-94.05, -30.1))
            Line((-94.05, -30.1), (-55.95, -30.1))
        make_face()
        with Locations((-75, 0)):
            Circle(F0_R_2, mode=Mode.SUBTRACT)
        with Locations((-75, 0)):
            Circle(F0_R_2)
    extrude(amount=-F5_DEPTH)

    # F0 (on Top) → F6 (cut)
    with BuildSketch(Plane.XY):
        with Locations((-75, 0)):
            Circle(F0_R_2)
    extrude(amount=-F6_DEPTH, mode=Mode.SUBTRACT)

    # F7#2
    f7_2_edges = [f5.edges().sort_by_distance(p)[0] for p in [
        (-94.05, -30.1, -7.5),
        (-55.95, -30.1, -7.5),
        (-44.9, -19.05, -7.5),
        (-44.9, 19.05, -7.5),
        (-55.95, 30.1, -7.5),
        (-94.05, 30.1, -7.5),
        (-105.1, 19.05, -7.5),
        (-105.1, -19.05, -7.5),
    ]]
    fillet(f7_2_edges, radius=F7_2_R)


solid = Compound([f1.part, f5.part])
